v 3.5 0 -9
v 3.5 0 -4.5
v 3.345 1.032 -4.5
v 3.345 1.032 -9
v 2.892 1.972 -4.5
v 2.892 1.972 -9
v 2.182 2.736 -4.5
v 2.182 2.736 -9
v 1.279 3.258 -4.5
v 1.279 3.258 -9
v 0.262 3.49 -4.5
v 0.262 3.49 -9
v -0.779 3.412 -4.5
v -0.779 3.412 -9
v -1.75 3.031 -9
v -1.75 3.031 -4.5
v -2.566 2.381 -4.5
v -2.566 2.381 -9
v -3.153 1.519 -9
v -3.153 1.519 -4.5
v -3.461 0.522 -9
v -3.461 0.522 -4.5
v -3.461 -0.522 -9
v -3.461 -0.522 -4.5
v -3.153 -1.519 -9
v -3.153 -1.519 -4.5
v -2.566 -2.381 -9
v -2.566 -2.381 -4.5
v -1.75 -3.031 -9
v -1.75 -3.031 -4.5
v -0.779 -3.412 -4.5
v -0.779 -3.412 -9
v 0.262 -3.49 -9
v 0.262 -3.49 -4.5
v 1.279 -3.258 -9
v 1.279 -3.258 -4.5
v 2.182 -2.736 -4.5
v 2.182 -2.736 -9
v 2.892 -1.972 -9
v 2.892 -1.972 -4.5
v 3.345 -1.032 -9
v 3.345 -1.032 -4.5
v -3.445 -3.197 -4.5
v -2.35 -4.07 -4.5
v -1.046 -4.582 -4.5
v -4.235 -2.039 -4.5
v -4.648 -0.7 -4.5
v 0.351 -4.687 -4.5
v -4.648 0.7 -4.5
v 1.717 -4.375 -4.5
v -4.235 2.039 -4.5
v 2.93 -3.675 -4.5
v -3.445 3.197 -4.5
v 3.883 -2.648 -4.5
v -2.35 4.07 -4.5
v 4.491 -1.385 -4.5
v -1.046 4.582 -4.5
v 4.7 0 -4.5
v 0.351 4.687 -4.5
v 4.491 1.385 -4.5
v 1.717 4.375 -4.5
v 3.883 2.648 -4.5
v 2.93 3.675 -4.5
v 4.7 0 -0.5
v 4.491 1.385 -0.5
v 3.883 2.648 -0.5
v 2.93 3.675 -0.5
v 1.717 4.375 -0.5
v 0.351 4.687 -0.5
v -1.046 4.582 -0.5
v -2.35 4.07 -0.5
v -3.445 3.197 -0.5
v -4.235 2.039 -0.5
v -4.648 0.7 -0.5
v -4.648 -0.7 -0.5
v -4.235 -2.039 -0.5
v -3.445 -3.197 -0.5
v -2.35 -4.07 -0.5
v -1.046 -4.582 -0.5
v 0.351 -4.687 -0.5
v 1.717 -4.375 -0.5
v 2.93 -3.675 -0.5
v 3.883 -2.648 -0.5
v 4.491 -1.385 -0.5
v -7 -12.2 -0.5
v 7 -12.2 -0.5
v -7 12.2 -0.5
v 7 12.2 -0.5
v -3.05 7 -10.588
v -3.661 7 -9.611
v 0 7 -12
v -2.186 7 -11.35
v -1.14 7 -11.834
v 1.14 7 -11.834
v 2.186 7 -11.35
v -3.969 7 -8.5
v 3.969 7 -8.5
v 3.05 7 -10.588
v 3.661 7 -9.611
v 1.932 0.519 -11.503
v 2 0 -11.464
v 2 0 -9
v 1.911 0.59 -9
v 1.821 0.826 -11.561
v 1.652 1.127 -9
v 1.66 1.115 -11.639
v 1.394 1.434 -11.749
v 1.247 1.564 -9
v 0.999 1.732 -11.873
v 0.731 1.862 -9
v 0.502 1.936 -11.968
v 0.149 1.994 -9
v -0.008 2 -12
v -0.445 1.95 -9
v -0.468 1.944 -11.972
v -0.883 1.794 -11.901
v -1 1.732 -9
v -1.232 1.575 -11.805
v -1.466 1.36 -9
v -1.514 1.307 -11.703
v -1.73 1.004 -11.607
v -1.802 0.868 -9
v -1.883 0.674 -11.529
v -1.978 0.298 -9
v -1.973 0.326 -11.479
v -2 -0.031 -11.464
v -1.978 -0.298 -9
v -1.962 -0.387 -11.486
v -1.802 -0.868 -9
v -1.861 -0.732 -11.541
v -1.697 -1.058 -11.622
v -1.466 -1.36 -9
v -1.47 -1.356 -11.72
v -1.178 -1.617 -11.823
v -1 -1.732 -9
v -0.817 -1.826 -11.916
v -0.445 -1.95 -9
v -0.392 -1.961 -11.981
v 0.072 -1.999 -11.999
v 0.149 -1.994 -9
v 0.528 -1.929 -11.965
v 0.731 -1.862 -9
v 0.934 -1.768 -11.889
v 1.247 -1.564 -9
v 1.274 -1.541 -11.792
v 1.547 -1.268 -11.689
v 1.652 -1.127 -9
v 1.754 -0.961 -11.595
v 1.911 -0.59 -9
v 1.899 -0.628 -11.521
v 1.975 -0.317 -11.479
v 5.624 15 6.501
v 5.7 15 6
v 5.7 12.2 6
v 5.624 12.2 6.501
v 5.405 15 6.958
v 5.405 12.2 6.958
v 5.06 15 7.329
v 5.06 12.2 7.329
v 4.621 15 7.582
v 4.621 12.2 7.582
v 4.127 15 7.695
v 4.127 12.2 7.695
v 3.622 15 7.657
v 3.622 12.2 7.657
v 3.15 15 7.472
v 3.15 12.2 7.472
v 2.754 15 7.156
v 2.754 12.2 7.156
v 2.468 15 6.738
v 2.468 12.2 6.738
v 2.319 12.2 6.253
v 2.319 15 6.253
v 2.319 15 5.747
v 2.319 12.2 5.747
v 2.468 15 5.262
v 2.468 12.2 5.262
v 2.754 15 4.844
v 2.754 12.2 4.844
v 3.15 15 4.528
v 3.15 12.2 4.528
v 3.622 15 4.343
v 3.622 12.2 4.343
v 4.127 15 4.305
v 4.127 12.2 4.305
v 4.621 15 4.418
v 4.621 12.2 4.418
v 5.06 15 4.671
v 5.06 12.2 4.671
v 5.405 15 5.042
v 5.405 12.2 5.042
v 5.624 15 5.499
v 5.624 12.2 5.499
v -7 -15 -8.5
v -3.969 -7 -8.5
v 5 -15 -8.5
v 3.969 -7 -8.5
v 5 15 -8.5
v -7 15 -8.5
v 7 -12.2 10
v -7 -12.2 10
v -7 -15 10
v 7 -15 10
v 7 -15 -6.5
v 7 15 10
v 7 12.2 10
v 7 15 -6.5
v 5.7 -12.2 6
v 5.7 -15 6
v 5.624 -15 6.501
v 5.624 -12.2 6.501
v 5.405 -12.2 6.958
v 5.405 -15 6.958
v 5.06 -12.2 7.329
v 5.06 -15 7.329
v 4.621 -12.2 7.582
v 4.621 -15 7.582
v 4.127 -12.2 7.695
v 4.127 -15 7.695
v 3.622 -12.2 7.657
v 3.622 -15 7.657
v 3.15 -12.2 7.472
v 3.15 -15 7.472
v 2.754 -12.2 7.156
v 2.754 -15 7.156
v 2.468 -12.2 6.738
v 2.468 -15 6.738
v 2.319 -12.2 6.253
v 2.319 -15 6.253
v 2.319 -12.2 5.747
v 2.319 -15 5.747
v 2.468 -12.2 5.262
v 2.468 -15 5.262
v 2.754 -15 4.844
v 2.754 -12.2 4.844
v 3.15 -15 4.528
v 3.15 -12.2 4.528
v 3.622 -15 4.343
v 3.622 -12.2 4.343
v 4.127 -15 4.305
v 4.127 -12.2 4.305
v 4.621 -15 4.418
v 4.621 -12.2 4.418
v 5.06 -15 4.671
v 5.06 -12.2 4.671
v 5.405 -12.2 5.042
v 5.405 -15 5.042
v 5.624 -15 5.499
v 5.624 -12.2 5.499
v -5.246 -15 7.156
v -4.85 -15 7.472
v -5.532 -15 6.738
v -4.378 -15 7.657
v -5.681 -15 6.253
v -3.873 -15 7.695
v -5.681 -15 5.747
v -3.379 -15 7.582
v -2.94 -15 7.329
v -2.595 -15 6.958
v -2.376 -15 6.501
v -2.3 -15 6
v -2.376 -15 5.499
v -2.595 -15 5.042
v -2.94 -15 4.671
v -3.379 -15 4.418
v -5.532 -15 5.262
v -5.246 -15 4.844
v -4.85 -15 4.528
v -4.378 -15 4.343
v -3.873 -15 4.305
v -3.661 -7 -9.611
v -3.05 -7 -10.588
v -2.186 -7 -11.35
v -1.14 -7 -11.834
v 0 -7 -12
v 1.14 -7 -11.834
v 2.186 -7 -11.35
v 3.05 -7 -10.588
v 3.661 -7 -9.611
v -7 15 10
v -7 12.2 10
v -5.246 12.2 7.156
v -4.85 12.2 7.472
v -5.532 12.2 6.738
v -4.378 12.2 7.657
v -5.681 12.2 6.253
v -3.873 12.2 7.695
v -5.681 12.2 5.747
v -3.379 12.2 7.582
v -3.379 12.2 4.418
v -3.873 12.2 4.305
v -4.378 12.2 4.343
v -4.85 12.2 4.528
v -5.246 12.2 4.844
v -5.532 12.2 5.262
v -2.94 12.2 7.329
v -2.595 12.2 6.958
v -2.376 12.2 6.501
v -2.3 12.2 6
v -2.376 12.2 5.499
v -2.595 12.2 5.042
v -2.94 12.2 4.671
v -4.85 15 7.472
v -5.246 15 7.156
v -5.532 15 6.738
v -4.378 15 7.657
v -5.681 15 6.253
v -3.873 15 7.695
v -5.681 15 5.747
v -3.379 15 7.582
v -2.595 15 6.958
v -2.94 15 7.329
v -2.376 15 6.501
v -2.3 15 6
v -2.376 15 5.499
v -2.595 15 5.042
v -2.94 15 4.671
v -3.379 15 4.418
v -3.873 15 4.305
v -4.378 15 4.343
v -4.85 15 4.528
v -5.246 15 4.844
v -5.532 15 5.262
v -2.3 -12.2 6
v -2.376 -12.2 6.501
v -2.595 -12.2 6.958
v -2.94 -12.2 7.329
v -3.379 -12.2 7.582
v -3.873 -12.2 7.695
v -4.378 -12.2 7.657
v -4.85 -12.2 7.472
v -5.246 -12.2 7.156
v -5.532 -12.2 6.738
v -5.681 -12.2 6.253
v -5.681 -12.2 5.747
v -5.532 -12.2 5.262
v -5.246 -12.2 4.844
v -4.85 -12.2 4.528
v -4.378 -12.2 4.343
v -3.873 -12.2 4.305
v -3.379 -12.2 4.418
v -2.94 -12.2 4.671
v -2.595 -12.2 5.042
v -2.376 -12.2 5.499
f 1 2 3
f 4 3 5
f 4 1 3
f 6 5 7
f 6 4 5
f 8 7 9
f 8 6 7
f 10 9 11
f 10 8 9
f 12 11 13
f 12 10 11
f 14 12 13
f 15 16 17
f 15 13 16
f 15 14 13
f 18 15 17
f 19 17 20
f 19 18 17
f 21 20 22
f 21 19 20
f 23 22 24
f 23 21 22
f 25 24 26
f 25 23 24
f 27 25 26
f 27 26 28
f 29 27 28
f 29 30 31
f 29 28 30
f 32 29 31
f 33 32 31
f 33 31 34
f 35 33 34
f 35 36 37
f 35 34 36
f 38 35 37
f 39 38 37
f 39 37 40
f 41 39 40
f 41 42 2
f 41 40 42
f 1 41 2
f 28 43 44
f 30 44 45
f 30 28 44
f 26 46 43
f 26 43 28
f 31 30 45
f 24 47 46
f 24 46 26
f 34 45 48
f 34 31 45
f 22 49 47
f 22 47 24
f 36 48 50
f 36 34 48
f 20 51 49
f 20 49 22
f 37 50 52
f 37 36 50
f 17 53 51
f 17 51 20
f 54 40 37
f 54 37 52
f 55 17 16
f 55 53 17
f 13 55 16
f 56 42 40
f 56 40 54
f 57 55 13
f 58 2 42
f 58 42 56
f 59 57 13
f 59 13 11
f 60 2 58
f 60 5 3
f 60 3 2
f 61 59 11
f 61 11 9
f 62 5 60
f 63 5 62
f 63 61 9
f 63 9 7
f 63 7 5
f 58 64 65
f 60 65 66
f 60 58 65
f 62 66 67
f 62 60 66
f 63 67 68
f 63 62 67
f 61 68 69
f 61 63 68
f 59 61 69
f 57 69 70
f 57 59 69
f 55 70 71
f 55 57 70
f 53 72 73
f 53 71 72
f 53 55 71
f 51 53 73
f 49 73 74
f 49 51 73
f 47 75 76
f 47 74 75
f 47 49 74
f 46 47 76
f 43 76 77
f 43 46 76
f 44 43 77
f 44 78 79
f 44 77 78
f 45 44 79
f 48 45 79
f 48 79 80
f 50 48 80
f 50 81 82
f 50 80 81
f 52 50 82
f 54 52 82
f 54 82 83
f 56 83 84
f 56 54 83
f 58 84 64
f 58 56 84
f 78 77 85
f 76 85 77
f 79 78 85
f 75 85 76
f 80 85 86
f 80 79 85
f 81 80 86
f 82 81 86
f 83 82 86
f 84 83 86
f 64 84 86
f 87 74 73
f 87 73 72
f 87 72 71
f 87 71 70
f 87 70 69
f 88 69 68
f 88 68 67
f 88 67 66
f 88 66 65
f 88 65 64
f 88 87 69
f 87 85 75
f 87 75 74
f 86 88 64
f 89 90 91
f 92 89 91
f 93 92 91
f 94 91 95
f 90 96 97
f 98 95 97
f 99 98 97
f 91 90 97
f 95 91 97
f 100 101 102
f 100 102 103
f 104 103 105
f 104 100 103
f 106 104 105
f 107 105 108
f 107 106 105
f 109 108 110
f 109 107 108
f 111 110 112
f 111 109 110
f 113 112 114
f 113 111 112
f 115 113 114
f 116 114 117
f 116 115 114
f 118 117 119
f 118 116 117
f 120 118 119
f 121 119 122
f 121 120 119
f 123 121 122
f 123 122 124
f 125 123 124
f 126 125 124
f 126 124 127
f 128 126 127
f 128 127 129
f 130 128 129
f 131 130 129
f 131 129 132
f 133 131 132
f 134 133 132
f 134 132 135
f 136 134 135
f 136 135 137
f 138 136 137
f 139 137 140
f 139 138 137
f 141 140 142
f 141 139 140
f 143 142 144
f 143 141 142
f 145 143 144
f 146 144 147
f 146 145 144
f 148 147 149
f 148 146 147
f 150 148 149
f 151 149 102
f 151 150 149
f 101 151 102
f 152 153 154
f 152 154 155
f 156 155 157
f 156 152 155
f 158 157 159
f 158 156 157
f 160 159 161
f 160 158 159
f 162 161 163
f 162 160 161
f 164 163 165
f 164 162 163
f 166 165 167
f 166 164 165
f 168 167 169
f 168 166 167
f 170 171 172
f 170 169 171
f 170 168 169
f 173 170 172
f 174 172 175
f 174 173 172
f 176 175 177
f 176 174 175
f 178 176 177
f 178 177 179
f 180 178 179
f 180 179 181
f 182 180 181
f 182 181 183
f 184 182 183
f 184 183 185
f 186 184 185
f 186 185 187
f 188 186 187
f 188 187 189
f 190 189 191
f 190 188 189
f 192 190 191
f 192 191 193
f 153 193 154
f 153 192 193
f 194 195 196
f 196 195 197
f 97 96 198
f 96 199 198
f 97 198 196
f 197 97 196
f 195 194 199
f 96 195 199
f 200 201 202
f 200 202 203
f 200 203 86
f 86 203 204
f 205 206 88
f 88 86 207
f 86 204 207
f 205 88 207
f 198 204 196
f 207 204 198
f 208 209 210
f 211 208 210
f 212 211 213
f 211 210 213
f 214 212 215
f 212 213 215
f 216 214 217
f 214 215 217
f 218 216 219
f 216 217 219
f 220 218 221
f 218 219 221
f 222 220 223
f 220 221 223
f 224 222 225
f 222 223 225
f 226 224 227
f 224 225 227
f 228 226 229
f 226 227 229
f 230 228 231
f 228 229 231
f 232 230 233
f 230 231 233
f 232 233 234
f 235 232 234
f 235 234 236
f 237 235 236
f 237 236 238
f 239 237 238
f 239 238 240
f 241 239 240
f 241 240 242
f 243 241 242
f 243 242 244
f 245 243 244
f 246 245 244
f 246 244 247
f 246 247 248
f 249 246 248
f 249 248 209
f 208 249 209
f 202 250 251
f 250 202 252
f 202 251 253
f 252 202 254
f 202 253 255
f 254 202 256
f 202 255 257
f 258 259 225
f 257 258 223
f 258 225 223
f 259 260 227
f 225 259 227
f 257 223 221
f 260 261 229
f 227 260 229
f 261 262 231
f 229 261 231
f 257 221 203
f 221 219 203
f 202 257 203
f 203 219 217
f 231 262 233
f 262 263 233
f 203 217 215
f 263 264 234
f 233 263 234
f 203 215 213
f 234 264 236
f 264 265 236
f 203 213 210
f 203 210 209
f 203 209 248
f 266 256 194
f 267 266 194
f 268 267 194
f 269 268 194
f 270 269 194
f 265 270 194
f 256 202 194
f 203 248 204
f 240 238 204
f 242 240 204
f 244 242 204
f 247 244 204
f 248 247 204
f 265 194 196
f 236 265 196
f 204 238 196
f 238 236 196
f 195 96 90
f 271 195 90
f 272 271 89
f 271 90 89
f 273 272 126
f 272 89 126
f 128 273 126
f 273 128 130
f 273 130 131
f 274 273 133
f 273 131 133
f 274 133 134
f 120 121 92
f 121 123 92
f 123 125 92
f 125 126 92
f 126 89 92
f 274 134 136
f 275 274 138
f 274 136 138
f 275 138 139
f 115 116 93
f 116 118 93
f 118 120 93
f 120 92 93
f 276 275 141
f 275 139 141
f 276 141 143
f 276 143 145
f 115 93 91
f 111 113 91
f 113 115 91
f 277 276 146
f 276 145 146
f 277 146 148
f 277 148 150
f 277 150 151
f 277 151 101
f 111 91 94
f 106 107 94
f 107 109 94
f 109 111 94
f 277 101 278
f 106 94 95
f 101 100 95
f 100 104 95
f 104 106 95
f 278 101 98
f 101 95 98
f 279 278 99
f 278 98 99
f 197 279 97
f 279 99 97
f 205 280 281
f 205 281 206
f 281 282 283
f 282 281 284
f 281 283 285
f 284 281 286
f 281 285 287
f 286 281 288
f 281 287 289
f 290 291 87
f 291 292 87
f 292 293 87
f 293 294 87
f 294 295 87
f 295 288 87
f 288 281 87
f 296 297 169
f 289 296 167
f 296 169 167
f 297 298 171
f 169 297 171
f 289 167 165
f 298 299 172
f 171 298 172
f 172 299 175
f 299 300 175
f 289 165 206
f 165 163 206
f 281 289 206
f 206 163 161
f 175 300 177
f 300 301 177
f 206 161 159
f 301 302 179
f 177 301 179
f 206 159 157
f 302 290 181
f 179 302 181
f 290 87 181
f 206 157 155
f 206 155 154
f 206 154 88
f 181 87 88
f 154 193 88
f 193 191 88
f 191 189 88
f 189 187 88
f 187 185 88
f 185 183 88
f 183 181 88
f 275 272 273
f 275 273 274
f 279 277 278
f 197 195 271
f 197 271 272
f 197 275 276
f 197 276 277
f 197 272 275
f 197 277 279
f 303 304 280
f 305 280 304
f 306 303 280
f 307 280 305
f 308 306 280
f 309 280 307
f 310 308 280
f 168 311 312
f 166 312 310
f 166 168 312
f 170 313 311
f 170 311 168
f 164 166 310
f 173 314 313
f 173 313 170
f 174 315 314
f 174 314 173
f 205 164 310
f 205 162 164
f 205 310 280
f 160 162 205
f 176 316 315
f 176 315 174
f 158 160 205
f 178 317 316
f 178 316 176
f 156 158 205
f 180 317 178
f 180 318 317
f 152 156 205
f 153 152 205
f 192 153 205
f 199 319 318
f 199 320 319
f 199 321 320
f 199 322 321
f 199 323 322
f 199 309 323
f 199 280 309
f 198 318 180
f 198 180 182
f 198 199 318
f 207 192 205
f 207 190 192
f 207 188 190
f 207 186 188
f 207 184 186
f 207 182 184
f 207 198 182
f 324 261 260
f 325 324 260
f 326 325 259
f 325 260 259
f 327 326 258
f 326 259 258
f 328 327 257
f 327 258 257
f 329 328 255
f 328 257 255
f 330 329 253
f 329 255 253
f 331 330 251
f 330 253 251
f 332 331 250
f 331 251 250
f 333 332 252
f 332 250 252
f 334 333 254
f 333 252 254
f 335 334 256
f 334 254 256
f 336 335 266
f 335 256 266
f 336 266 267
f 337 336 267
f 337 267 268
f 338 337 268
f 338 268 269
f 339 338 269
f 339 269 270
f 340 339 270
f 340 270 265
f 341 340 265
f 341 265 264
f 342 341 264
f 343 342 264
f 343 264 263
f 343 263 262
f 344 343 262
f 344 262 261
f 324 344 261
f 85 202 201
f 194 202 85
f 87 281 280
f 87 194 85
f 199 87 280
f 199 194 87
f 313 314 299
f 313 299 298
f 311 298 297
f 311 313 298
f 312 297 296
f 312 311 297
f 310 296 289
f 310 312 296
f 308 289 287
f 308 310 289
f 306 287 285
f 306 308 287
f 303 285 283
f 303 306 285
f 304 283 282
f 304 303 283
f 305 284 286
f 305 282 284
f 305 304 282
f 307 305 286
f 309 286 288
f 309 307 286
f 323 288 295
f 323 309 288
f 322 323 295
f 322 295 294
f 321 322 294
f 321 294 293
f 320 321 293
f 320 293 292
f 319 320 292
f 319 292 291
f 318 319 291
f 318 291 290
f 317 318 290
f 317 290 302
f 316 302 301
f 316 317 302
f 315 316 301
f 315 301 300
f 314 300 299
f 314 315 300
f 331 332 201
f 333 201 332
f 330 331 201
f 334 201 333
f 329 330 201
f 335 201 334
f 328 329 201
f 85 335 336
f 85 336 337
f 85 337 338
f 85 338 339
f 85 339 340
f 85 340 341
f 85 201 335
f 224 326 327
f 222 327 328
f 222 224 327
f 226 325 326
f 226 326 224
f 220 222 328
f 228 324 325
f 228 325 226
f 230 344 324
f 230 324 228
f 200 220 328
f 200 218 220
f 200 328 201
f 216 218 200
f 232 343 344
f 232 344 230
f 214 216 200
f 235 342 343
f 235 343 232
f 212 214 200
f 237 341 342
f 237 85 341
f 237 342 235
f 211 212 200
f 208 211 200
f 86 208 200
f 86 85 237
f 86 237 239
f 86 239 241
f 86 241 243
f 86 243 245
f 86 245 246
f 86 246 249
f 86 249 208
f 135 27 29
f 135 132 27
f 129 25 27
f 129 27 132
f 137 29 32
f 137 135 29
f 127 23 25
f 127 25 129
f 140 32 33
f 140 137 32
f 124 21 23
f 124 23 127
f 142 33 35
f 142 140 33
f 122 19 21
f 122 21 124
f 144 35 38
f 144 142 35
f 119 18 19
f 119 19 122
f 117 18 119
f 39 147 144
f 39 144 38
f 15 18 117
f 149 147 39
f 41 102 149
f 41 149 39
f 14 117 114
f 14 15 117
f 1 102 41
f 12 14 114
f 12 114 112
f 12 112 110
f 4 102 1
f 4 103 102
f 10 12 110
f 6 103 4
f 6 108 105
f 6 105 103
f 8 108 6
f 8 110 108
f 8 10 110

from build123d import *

# Parameters (mm, degrees)
CYLINDER036_R          = 3.5
CYLINDER036_DEPTH      = 30
CYLINDER035_R          = 4.7
CYLINDER035_DEPTH      = 30
CYLINDER065_R          = 2
CYLINDER065_DEPTH      = 62
CYLINDER066_R          = 4
CYLINDER066_DEPTH      = 14
CYLINDER066_ROLL_ANGLE = 90
CYLINDER030_R          = 1.7
CYLINDER030_DEPTH      = 19
CYLINDER030_ROLL_ANGLE = 90
CYLINDER033_R          = 1.7
CYLINDER033_DEPTH      = 19
CYLINDER033_ROLL_ANGLE = 90
CYLINDER034_R          = 1.7
CYLINDER034_DEPTH      = 19
CYLINDER034_ROLL_ANGLE = 90
CYLINDER029_R          = 1.7
CYLINDER029_DEPTH      = 19
CYLINDER029_ROLL_ANGLE = 90
BOX001012_W            = 14
BOX001012_H            = 2.8
BOX001012_DEPTH        = 11
BOX001011_W            = 14
BOX001011_H            = 2.8
BOX001011_DEPTH        = 11
BOX001010_W            = 14
BOX001010_H            = 30
BOX001010_DEPTH        = 8
CHAMFER011_SIZE        = 2


with BuildPart() as cylinder036:
    # Cylinder036 → Cylinder036 (new body)
    with BuildSketch(Plane.XY.offset(-9)):
        Circle(CYLINDER036_R)
    extrude(amount=CYLINDER036_DEPTH)


with BuildPart() as bearing_nut:
    # Cylinder035 → Cylinder035 (new body)
    with BuildSketch(Plane.XY.offset(-4.5)):
        Circle(CYLINDER035_R)
    extrude(amount=CYLINDER035_DEPTH)

    # Fusion080: union Cylinder036
    add(cylinder036.part)


with BuildPart() as cylinder065:
    # Cylinder065 → Cylinder065 (new body)
    with BuildSketch(Plane.XY.offset(-59)):
        Circle(CYLINDER065_R)
    extrude(amount=CYLINDER065_DEPTH)


with BuildPart() as cut035:
    # Cylinder066 → Cylinder066 (new body)
    with BuildSketch(Plane.XY):
        Circle(CYLINDER066_R)
    extrude(amount=CYLINDER066_DEPTH)


with BuildPart() as cut035_1:
    # Cylinder066 roll: moved
    add(cut035.part.rotate(Axis((0, 0, 0), (1, 0, 0)), CYLINDER066_ROLL_ANGLE))


with BuildPart() as cut035_2:
    # Cylinder066 placement: moved
    add(cut035_1.part.moved(Location((0, 7, -8))))

    # Cut035: cut Cylinder065
    add(cylinder065.part, mode=Mode.SUBTRACT)


with BuildPart() as cylinder030:
    # Cylinder030 → Cylinder030 (new body)
    with BuildSketch(Plane.XY):
        Circle(CYLINDER030_R)
    extrude(amount=CYLINDER030_DEPTH)


with BuildPart() as cylinder030_1:
    # Cylinder030 roll: moved
    add(cylinder030.part.rotate(Axis((0, 0, 0), (1, 0, 0)), CYLINDER030_ROLL_ANGLE))


with BuildPart() as cylinder030_2:
    # Cylinder030 placement: moved
    add(cylinder030_1.part.moved(Location((4, 24, 6))))


with BuildPart() as cylinder033:
    # Cylinder033 → Cylinder033 (new body)
    with BuildSketch(Plane.XY):
        Circle(CYLINDER033_R)
    extrude(amount=CYLINDER033_DEPTH)


with BuildPart() as cylinder033_1:
    # Cylinder033 roll: moved
    add(cylinder033.part.rotate(Axis((0, 0, 0), (1, 0, 0)), CYLINDER033_ROLL_ANGLE))


with BuildPart() as cylinder033_2:
    # Cylinder033 placement: moved
    add(cylinder033_1.part.moved(Location((4, 24, 6))))


with BuildPart() as part_mirroring002:
    # Part__Mirroring002: instance of Cylinder033
    add(cylinder033_2.part.mirror(Plane(origin=(0, 0, 0), x_dir=(1, 0, 0), z_dir=(0, 1, 0))))


with BuildPart() as cylinder034:
    # Cylinder034 → Cylinder034 (new body)
    with BuildSketch(Plane.XY):
        Circle(CYLINDER034_R)
    extrude(amount=CYLINDER034_DEPTH)


with BuildPart() as cylinder034_1:
    # Cylinder034 roll: moved
    add(cylinder034.part.rotate(Axis((0, 0, 0), (1, 0, 0)), CYLINDER034_ROLL_ANGLE))


with BuildPart() as cylinder034_2:
    # Cylinder034 placement: moved
    add(cylinder034_1.part.moved(Location((-4, 24, 6))))


with BuildPart() as part_mirroring003:
    # Part__Mirroring003: instance of Cylinder034
    add(cylinder034_2.part.mirror(Plane(origin=(0, 0, 0), x_dir=(1, 0, 0), z_dir=(0, 1, 0))))


with BuildPart() as m3_clear_a:
    # Cylinder029 → Cylinder029 (new body)
    with BuildSketch(Plane.XY):
        Circle(CYLINDER029_R)
    extrude(amount=CYLINDER029_DEPTH)


with BuildPart() as m3_clear_a_1:
    # Cylinder029 roll: moved
    add(m3_clear_a.part.rotate(Axis((0, 0, 0), (1, 0, 0)), CYLINDER029_ROLL_ANGLE))


with BuildPart() as m3_clear_a_2:
    # Cylinder029 placement: moved
    add(m3_clear_a_1.part.moved(Location((-4, 24, 6))))

    # Fusion057: union Cylinder030, Part__Mirroring002, Part__Mirroring003
    add(cylinder030_2.part)
    add(part_mirroring002.part)
    add(part_mirroring003.part)


with BuildPart() as cube010:
    # Box001012 → Box001012 (new body)
    with BuildSketch(Plane(origin=(-7, 12.2, -1), x_dir=(1, 0, 0), z_dir=(0, 0, 1))):
        with Locations((7, 1.4)):
            Rectangle(BOX001012_W, BOX001012_H)
    extrude(amount=BOX001012_DEPTH)


with BuildPart() as cube009:
    # Box001011 → Box001011 (new body)
    with BuildSketch(Plane(origin=(-7, -15, -1), x_dir=(1, 0, 0), z_dir=(0, 0, 1))):
        with Locations((7, 1.4)):
            Rectangle(BOX001011_W, BOX001011_H)
    extrude(amount=BOX001011_DEPTH)


with BuildPart() as bearing_clamp:
    # Box001010 → Box001010 (new body)
    with BuildSketch(Plane(origin=(-7, -15, -8.5), x_dir=(1, 0, 0), z_dir=(0, 0, 1))):
        with Locations((7, 15)):
            Rectangle(BOX001010_W, BOX001010_H)
    extrude(amount=BOX001010_DEPTH)

    # Fusion055: union Cube010, Cube009
    add(cube010.part)
    add(cube009.part)

    # Cut006: cut M3-clear-a
    add(m3_clear_a_2.part, mode=Mode.SUBTRACT)

    # Fusion081: union Cut035
    add(cut035_2.part)

    # Cut036: cut bearing-nut
    add(bearing_nut.part, mode=Mode.SUBTRACT)

    # Chamfer011
    chamfer011_edges = [bearing_clamp.edges().sort_by_distance(p)[0] for p in [
        (7, 0, -8.5),
    ]]
    chamfer(chamfer011_edges, length=CHAMFER011_SIZE)


solid = bearing_clamp.part
